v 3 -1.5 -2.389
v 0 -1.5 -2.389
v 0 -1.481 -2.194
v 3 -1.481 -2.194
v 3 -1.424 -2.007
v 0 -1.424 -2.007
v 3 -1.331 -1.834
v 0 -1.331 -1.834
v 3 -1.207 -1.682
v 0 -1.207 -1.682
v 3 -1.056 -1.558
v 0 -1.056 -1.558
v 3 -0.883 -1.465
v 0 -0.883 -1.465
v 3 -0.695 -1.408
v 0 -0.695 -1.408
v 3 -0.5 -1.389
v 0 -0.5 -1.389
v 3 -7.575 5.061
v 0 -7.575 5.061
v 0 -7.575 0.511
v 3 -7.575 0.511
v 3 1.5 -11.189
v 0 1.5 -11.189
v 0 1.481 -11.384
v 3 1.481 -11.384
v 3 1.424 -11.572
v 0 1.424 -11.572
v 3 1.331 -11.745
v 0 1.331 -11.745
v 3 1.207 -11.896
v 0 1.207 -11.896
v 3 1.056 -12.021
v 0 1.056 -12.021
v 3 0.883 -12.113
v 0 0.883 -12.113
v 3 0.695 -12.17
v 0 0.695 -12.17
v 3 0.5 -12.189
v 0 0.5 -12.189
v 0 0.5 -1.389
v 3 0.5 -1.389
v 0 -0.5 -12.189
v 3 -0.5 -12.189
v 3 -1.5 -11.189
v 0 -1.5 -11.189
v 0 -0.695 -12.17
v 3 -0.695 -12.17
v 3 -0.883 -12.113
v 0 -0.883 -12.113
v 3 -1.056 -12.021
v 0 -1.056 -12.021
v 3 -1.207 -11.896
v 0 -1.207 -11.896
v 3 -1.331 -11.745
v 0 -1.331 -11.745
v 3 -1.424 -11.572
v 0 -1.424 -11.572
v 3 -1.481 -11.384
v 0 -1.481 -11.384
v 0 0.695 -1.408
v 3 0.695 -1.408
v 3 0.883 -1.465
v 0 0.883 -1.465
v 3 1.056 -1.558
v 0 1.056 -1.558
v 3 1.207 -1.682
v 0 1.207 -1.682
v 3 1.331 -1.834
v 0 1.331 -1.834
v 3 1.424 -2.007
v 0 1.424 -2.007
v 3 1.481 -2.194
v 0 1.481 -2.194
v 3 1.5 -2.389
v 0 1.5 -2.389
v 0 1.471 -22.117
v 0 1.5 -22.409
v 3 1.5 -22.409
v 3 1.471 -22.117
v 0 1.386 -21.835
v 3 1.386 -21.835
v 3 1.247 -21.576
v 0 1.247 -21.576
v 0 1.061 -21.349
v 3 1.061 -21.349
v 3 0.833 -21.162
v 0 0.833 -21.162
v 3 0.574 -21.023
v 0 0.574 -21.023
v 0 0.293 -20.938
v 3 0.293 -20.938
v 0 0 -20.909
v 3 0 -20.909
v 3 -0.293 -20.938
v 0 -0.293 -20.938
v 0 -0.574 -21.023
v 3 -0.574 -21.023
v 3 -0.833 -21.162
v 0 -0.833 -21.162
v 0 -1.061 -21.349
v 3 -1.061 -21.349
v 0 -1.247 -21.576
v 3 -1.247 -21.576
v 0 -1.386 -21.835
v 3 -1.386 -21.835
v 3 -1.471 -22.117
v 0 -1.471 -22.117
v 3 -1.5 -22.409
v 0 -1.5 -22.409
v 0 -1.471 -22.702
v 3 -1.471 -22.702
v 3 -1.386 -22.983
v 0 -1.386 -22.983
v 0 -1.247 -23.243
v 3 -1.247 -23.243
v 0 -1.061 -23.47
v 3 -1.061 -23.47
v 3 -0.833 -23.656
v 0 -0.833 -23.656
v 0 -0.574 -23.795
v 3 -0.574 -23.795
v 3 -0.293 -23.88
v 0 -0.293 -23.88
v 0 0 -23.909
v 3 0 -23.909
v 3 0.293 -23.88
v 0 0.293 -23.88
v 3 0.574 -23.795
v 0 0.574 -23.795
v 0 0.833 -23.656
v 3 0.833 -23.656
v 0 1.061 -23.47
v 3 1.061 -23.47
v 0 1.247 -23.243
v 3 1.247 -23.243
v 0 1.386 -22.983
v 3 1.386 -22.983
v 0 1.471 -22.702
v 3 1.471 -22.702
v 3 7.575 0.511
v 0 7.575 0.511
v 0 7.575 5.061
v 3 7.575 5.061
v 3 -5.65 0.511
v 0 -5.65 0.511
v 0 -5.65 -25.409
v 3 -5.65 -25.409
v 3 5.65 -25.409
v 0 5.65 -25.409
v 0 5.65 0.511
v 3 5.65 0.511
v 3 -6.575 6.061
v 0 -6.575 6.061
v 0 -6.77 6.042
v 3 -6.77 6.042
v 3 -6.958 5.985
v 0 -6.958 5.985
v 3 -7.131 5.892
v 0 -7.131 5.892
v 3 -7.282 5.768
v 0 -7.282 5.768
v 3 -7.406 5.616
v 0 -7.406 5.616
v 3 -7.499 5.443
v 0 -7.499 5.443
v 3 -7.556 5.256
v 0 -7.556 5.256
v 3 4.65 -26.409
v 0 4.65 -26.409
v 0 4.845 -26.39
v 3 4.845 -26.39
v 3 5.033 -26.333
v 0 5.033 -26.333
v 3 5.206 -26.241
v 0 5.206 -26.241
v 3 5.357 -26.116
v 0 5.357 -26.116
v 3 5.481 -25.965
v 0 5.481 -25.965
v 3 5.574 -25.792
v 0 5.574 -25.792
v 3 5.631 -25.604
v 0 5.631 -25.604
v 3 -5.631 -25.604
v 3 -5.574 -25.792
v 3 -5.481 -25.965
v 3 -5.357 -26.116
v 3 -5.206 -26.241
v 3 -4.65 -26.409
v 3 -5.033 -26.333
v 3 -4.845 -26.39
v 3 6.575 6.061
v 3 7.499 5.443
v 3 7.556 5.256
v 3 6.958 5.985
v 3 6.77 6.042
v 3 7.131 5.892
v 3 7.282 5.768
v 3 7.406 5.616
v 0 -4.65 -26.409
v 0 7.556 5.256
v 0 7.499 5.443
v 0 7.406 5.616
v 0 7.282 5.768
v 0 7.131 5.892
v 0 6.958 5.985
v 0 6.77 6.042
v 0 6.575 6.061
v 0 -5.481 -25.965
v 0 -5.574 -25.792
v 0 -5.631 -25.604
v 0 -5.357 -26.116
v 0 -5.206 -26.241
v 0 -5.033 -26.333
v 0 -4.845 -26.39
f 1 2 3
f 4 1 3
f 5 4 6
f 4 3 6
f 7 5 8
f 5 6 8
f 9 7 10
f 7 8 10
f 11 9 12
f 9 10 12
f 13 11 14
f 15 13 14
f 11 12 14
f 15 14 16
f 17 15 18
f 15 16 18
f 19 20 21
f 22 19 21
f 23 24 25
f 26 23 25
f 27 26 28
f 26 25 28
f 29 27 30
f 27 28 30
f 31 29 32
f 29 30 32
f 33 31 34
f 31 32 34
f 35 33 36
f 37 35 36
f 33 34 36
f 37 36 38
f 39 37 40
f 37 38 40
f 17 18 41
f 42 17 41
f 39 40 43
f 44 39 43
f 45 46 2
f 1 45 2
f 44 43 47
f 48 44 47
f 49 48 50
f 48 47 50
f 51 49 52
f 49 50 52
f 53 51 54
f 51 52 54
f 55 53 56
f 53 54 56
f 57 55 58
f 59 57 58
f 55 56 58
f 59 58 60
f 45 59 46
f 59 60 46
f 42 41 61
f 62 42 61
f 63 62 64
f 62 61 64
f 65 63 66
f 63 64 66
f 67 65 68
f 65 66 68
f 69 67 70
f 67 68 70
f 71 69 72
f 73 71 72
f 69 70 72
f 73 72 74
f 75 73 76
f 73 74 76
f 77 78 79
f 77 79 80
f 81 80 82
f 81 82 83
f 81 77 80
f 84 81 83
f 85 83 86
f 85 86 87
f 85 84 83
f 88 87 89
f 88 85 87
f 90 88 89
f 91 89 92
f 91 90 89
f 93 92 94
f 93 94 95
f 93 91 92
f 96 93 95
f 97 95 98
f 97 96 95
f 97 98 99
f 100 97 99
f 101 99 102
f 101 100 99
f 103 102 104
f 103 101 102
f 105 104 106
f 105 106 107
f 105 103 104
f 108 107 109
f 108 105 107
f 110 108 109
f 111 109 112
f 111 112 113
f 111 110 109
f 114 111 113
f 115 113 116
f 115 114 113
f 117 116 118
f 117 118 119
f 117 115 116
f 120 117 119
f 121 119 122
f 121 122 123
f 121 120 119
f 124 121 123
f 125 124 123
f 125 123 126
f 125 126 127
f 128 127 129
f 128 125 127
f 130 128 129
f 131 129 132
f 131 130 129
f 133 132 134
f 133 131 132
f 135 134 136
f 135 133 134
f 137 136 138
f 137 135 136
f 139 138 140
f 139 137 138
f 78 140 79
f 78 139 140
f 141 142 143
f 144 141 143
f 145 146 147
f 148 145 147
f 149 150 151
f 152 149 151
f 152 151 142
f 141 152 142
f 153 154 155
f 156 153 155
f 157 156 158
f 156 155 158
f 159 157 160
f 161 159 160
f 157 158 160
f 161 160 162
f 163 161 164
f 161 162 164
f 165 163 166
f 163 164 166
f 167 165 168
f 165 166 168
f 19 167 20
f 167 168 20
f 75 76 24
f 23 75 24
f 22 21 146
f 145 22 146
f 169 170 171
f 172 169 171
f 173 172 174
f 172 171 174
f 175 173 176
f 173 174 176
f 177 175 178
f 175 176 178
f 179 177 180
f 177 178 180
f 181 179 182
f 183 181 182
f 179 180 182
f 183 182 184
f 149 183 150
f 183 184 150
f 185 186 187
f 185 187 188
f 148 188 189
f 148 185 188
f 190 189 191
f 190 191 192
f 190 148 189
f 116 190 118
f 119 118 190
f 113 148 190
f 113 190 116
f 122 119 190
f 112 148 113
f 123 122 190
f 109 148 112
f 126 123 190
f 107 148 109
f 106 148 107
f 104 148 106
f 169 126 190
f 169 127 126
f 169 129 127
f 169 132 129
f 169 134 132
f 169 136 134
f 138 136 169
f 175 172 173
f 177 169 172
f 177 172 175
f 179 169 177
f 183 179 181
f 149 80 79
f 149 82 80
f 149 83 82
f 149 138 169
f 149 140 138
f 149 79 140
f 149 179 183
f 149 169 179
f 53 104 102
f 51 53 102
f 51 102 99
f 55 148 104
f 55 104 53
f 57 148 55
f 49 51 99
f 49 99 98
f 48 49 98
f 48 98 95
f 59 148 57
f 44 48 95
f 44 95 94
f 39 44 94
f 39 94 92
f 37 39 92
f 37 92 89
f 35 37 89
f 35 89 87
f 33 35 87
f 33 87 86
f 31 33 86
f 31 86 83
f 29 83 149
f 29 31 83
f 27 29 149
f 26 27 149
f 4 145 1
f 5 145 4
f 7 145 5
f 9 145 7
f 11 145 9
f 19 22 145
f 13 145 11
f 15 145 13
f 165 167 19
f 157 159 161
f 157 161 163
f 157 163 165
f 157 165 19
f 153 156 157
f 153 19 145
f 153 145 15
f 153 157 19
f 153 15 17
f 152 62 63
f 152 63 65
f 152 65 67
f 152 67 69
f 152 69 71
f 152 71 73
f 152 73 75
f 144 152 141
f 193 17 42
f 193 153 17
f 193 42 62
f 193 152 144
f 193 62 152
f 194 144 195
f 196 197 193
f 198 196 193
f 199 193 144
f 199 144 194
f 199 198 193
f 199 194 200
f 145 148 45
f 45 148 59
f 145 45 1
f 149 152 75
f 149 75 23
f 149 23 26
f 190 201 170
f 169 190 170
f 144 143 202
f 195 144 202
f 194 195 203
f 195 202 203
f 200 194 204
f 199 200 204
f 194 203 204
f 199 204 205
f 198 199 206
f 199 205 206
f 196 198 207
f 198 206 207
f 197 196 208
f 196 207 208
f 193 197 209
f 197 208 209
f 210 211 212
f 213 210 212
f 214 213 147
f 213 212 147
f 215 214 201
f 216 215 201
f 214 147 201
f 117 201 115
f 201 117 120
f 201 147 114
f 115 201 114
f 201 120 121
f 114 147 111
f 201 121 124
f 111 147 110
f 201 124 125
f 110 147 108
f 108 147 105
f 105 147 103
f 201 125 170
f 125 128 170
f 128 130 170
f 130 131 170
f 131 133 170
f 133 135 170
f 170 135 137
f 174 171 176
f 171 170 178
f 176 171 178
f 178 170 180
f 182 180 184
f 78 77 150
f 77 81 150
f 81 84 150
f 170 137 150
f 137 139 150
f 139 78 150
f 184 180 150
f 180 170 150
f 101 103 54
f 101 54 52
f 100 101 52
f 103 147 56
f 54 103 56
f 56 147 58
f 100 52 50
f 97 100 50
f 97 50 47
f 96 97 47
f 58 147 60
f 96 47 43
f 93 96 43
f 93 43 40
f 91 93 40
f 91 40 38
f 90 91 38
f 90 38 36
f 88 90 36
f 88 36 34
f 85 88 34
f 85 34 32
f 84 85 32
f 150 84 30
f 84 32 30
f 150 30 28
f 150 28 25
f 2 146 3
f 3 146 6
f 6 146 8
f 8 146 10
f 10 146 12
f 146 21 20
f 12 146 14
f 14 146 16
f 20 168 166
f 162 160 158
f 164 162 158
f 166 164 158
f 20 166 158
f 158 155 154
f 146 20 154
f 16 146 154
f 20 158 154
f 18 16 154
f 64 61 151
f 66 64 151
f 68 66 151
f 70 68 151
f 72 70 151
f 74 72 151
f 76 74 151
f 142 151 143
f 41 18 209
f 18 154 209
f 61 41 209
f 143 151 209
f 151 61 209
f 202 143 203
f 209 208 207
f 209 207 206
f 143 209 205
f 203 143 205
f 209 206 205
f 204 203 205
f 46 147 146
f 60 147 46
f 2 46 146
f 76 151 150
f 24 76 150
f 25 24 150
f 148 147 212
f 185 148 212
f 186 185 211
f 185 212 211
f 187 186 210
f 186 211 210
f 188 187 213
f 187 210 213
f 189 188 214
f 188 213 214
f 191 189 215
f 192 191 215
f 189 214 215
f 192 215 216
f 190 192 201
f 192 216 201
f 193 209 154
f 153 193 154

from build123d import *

# Parameters (mm, degrees)
F0_R     = 1.5
F1_DEPTH = 3


with BuildPart() as f1:
    # F0 (on Right) → F1 (new body)
    with BuildSketch(Plane.YZ):
        with BuildLine():
            Line((6.575, 6.060806), (-6.575, 6.060806))
            ThreePointArc((-6.575, 6.060806), (-7.282107, 5.767913), (-7.575, 5.060806))
            Line((-7.575, 5.060806), (-7.575, 0.510806))
            Line((-7.575, 0.510806), (-5.65, 0.510806))
            Line((-5.65, 0.510806), (-5.65, -25.409194))
            ThreePointArc((-5.65, -25.409194), (-5.357107, -26.1163), (-4.65, -26.409194))
            Line((-4.65, -26.409194), (4.65, -26.409194))
            ThreePointArc((4.65, -26.409194), (5.357107, -26.1163), (5.65, -25.409194))
            Line((5.65, -25.409194), (5.65, 0.510806))
            Line((5.65, 0.510806), (7.575, 0.510806))
            Line((7.575, 0.510806), (7.575, 5.060806))
            ThreePointArc((7.575, 5.060806), (7.282107, 5.767913), (6.575, 6.060806))
        make_face()
        with Locations((0, -22.409194)):
            Circle(F0_R, mode=Mode.SUBTRACT)
        with BuildLine():
            ThreePointArc((-1.5, -2.389194), (-1.207107, -1.682087), (-0.5, -1.389194))
            Line((-0.5, -1.389194), (0.5, -1.389194))
            ThreePointArc((0.5, -1.389194), (1.207107, -1.682087), (1.5, -2.389194))
            Line((1.5, -2.389194), (1.5, -11.189194))
            ThreePointArc((1.5, -11.189194), (1.207107, -11.8963), (0.5, -12.189194))
            Line((0.5, -12.189194), (-0.5, -12.189194))
            ThreePointArc((-0.5, -12.189194), (-1.207107, -11.8963), (-1.5, -11.189194))
            Line((-1.5, -11.189194), (-1.5, -2.389194))
        make_face(mode=Mode.SUBTRACT)
    extrude(amount=F1_DEPTH)


solid = f1.part
